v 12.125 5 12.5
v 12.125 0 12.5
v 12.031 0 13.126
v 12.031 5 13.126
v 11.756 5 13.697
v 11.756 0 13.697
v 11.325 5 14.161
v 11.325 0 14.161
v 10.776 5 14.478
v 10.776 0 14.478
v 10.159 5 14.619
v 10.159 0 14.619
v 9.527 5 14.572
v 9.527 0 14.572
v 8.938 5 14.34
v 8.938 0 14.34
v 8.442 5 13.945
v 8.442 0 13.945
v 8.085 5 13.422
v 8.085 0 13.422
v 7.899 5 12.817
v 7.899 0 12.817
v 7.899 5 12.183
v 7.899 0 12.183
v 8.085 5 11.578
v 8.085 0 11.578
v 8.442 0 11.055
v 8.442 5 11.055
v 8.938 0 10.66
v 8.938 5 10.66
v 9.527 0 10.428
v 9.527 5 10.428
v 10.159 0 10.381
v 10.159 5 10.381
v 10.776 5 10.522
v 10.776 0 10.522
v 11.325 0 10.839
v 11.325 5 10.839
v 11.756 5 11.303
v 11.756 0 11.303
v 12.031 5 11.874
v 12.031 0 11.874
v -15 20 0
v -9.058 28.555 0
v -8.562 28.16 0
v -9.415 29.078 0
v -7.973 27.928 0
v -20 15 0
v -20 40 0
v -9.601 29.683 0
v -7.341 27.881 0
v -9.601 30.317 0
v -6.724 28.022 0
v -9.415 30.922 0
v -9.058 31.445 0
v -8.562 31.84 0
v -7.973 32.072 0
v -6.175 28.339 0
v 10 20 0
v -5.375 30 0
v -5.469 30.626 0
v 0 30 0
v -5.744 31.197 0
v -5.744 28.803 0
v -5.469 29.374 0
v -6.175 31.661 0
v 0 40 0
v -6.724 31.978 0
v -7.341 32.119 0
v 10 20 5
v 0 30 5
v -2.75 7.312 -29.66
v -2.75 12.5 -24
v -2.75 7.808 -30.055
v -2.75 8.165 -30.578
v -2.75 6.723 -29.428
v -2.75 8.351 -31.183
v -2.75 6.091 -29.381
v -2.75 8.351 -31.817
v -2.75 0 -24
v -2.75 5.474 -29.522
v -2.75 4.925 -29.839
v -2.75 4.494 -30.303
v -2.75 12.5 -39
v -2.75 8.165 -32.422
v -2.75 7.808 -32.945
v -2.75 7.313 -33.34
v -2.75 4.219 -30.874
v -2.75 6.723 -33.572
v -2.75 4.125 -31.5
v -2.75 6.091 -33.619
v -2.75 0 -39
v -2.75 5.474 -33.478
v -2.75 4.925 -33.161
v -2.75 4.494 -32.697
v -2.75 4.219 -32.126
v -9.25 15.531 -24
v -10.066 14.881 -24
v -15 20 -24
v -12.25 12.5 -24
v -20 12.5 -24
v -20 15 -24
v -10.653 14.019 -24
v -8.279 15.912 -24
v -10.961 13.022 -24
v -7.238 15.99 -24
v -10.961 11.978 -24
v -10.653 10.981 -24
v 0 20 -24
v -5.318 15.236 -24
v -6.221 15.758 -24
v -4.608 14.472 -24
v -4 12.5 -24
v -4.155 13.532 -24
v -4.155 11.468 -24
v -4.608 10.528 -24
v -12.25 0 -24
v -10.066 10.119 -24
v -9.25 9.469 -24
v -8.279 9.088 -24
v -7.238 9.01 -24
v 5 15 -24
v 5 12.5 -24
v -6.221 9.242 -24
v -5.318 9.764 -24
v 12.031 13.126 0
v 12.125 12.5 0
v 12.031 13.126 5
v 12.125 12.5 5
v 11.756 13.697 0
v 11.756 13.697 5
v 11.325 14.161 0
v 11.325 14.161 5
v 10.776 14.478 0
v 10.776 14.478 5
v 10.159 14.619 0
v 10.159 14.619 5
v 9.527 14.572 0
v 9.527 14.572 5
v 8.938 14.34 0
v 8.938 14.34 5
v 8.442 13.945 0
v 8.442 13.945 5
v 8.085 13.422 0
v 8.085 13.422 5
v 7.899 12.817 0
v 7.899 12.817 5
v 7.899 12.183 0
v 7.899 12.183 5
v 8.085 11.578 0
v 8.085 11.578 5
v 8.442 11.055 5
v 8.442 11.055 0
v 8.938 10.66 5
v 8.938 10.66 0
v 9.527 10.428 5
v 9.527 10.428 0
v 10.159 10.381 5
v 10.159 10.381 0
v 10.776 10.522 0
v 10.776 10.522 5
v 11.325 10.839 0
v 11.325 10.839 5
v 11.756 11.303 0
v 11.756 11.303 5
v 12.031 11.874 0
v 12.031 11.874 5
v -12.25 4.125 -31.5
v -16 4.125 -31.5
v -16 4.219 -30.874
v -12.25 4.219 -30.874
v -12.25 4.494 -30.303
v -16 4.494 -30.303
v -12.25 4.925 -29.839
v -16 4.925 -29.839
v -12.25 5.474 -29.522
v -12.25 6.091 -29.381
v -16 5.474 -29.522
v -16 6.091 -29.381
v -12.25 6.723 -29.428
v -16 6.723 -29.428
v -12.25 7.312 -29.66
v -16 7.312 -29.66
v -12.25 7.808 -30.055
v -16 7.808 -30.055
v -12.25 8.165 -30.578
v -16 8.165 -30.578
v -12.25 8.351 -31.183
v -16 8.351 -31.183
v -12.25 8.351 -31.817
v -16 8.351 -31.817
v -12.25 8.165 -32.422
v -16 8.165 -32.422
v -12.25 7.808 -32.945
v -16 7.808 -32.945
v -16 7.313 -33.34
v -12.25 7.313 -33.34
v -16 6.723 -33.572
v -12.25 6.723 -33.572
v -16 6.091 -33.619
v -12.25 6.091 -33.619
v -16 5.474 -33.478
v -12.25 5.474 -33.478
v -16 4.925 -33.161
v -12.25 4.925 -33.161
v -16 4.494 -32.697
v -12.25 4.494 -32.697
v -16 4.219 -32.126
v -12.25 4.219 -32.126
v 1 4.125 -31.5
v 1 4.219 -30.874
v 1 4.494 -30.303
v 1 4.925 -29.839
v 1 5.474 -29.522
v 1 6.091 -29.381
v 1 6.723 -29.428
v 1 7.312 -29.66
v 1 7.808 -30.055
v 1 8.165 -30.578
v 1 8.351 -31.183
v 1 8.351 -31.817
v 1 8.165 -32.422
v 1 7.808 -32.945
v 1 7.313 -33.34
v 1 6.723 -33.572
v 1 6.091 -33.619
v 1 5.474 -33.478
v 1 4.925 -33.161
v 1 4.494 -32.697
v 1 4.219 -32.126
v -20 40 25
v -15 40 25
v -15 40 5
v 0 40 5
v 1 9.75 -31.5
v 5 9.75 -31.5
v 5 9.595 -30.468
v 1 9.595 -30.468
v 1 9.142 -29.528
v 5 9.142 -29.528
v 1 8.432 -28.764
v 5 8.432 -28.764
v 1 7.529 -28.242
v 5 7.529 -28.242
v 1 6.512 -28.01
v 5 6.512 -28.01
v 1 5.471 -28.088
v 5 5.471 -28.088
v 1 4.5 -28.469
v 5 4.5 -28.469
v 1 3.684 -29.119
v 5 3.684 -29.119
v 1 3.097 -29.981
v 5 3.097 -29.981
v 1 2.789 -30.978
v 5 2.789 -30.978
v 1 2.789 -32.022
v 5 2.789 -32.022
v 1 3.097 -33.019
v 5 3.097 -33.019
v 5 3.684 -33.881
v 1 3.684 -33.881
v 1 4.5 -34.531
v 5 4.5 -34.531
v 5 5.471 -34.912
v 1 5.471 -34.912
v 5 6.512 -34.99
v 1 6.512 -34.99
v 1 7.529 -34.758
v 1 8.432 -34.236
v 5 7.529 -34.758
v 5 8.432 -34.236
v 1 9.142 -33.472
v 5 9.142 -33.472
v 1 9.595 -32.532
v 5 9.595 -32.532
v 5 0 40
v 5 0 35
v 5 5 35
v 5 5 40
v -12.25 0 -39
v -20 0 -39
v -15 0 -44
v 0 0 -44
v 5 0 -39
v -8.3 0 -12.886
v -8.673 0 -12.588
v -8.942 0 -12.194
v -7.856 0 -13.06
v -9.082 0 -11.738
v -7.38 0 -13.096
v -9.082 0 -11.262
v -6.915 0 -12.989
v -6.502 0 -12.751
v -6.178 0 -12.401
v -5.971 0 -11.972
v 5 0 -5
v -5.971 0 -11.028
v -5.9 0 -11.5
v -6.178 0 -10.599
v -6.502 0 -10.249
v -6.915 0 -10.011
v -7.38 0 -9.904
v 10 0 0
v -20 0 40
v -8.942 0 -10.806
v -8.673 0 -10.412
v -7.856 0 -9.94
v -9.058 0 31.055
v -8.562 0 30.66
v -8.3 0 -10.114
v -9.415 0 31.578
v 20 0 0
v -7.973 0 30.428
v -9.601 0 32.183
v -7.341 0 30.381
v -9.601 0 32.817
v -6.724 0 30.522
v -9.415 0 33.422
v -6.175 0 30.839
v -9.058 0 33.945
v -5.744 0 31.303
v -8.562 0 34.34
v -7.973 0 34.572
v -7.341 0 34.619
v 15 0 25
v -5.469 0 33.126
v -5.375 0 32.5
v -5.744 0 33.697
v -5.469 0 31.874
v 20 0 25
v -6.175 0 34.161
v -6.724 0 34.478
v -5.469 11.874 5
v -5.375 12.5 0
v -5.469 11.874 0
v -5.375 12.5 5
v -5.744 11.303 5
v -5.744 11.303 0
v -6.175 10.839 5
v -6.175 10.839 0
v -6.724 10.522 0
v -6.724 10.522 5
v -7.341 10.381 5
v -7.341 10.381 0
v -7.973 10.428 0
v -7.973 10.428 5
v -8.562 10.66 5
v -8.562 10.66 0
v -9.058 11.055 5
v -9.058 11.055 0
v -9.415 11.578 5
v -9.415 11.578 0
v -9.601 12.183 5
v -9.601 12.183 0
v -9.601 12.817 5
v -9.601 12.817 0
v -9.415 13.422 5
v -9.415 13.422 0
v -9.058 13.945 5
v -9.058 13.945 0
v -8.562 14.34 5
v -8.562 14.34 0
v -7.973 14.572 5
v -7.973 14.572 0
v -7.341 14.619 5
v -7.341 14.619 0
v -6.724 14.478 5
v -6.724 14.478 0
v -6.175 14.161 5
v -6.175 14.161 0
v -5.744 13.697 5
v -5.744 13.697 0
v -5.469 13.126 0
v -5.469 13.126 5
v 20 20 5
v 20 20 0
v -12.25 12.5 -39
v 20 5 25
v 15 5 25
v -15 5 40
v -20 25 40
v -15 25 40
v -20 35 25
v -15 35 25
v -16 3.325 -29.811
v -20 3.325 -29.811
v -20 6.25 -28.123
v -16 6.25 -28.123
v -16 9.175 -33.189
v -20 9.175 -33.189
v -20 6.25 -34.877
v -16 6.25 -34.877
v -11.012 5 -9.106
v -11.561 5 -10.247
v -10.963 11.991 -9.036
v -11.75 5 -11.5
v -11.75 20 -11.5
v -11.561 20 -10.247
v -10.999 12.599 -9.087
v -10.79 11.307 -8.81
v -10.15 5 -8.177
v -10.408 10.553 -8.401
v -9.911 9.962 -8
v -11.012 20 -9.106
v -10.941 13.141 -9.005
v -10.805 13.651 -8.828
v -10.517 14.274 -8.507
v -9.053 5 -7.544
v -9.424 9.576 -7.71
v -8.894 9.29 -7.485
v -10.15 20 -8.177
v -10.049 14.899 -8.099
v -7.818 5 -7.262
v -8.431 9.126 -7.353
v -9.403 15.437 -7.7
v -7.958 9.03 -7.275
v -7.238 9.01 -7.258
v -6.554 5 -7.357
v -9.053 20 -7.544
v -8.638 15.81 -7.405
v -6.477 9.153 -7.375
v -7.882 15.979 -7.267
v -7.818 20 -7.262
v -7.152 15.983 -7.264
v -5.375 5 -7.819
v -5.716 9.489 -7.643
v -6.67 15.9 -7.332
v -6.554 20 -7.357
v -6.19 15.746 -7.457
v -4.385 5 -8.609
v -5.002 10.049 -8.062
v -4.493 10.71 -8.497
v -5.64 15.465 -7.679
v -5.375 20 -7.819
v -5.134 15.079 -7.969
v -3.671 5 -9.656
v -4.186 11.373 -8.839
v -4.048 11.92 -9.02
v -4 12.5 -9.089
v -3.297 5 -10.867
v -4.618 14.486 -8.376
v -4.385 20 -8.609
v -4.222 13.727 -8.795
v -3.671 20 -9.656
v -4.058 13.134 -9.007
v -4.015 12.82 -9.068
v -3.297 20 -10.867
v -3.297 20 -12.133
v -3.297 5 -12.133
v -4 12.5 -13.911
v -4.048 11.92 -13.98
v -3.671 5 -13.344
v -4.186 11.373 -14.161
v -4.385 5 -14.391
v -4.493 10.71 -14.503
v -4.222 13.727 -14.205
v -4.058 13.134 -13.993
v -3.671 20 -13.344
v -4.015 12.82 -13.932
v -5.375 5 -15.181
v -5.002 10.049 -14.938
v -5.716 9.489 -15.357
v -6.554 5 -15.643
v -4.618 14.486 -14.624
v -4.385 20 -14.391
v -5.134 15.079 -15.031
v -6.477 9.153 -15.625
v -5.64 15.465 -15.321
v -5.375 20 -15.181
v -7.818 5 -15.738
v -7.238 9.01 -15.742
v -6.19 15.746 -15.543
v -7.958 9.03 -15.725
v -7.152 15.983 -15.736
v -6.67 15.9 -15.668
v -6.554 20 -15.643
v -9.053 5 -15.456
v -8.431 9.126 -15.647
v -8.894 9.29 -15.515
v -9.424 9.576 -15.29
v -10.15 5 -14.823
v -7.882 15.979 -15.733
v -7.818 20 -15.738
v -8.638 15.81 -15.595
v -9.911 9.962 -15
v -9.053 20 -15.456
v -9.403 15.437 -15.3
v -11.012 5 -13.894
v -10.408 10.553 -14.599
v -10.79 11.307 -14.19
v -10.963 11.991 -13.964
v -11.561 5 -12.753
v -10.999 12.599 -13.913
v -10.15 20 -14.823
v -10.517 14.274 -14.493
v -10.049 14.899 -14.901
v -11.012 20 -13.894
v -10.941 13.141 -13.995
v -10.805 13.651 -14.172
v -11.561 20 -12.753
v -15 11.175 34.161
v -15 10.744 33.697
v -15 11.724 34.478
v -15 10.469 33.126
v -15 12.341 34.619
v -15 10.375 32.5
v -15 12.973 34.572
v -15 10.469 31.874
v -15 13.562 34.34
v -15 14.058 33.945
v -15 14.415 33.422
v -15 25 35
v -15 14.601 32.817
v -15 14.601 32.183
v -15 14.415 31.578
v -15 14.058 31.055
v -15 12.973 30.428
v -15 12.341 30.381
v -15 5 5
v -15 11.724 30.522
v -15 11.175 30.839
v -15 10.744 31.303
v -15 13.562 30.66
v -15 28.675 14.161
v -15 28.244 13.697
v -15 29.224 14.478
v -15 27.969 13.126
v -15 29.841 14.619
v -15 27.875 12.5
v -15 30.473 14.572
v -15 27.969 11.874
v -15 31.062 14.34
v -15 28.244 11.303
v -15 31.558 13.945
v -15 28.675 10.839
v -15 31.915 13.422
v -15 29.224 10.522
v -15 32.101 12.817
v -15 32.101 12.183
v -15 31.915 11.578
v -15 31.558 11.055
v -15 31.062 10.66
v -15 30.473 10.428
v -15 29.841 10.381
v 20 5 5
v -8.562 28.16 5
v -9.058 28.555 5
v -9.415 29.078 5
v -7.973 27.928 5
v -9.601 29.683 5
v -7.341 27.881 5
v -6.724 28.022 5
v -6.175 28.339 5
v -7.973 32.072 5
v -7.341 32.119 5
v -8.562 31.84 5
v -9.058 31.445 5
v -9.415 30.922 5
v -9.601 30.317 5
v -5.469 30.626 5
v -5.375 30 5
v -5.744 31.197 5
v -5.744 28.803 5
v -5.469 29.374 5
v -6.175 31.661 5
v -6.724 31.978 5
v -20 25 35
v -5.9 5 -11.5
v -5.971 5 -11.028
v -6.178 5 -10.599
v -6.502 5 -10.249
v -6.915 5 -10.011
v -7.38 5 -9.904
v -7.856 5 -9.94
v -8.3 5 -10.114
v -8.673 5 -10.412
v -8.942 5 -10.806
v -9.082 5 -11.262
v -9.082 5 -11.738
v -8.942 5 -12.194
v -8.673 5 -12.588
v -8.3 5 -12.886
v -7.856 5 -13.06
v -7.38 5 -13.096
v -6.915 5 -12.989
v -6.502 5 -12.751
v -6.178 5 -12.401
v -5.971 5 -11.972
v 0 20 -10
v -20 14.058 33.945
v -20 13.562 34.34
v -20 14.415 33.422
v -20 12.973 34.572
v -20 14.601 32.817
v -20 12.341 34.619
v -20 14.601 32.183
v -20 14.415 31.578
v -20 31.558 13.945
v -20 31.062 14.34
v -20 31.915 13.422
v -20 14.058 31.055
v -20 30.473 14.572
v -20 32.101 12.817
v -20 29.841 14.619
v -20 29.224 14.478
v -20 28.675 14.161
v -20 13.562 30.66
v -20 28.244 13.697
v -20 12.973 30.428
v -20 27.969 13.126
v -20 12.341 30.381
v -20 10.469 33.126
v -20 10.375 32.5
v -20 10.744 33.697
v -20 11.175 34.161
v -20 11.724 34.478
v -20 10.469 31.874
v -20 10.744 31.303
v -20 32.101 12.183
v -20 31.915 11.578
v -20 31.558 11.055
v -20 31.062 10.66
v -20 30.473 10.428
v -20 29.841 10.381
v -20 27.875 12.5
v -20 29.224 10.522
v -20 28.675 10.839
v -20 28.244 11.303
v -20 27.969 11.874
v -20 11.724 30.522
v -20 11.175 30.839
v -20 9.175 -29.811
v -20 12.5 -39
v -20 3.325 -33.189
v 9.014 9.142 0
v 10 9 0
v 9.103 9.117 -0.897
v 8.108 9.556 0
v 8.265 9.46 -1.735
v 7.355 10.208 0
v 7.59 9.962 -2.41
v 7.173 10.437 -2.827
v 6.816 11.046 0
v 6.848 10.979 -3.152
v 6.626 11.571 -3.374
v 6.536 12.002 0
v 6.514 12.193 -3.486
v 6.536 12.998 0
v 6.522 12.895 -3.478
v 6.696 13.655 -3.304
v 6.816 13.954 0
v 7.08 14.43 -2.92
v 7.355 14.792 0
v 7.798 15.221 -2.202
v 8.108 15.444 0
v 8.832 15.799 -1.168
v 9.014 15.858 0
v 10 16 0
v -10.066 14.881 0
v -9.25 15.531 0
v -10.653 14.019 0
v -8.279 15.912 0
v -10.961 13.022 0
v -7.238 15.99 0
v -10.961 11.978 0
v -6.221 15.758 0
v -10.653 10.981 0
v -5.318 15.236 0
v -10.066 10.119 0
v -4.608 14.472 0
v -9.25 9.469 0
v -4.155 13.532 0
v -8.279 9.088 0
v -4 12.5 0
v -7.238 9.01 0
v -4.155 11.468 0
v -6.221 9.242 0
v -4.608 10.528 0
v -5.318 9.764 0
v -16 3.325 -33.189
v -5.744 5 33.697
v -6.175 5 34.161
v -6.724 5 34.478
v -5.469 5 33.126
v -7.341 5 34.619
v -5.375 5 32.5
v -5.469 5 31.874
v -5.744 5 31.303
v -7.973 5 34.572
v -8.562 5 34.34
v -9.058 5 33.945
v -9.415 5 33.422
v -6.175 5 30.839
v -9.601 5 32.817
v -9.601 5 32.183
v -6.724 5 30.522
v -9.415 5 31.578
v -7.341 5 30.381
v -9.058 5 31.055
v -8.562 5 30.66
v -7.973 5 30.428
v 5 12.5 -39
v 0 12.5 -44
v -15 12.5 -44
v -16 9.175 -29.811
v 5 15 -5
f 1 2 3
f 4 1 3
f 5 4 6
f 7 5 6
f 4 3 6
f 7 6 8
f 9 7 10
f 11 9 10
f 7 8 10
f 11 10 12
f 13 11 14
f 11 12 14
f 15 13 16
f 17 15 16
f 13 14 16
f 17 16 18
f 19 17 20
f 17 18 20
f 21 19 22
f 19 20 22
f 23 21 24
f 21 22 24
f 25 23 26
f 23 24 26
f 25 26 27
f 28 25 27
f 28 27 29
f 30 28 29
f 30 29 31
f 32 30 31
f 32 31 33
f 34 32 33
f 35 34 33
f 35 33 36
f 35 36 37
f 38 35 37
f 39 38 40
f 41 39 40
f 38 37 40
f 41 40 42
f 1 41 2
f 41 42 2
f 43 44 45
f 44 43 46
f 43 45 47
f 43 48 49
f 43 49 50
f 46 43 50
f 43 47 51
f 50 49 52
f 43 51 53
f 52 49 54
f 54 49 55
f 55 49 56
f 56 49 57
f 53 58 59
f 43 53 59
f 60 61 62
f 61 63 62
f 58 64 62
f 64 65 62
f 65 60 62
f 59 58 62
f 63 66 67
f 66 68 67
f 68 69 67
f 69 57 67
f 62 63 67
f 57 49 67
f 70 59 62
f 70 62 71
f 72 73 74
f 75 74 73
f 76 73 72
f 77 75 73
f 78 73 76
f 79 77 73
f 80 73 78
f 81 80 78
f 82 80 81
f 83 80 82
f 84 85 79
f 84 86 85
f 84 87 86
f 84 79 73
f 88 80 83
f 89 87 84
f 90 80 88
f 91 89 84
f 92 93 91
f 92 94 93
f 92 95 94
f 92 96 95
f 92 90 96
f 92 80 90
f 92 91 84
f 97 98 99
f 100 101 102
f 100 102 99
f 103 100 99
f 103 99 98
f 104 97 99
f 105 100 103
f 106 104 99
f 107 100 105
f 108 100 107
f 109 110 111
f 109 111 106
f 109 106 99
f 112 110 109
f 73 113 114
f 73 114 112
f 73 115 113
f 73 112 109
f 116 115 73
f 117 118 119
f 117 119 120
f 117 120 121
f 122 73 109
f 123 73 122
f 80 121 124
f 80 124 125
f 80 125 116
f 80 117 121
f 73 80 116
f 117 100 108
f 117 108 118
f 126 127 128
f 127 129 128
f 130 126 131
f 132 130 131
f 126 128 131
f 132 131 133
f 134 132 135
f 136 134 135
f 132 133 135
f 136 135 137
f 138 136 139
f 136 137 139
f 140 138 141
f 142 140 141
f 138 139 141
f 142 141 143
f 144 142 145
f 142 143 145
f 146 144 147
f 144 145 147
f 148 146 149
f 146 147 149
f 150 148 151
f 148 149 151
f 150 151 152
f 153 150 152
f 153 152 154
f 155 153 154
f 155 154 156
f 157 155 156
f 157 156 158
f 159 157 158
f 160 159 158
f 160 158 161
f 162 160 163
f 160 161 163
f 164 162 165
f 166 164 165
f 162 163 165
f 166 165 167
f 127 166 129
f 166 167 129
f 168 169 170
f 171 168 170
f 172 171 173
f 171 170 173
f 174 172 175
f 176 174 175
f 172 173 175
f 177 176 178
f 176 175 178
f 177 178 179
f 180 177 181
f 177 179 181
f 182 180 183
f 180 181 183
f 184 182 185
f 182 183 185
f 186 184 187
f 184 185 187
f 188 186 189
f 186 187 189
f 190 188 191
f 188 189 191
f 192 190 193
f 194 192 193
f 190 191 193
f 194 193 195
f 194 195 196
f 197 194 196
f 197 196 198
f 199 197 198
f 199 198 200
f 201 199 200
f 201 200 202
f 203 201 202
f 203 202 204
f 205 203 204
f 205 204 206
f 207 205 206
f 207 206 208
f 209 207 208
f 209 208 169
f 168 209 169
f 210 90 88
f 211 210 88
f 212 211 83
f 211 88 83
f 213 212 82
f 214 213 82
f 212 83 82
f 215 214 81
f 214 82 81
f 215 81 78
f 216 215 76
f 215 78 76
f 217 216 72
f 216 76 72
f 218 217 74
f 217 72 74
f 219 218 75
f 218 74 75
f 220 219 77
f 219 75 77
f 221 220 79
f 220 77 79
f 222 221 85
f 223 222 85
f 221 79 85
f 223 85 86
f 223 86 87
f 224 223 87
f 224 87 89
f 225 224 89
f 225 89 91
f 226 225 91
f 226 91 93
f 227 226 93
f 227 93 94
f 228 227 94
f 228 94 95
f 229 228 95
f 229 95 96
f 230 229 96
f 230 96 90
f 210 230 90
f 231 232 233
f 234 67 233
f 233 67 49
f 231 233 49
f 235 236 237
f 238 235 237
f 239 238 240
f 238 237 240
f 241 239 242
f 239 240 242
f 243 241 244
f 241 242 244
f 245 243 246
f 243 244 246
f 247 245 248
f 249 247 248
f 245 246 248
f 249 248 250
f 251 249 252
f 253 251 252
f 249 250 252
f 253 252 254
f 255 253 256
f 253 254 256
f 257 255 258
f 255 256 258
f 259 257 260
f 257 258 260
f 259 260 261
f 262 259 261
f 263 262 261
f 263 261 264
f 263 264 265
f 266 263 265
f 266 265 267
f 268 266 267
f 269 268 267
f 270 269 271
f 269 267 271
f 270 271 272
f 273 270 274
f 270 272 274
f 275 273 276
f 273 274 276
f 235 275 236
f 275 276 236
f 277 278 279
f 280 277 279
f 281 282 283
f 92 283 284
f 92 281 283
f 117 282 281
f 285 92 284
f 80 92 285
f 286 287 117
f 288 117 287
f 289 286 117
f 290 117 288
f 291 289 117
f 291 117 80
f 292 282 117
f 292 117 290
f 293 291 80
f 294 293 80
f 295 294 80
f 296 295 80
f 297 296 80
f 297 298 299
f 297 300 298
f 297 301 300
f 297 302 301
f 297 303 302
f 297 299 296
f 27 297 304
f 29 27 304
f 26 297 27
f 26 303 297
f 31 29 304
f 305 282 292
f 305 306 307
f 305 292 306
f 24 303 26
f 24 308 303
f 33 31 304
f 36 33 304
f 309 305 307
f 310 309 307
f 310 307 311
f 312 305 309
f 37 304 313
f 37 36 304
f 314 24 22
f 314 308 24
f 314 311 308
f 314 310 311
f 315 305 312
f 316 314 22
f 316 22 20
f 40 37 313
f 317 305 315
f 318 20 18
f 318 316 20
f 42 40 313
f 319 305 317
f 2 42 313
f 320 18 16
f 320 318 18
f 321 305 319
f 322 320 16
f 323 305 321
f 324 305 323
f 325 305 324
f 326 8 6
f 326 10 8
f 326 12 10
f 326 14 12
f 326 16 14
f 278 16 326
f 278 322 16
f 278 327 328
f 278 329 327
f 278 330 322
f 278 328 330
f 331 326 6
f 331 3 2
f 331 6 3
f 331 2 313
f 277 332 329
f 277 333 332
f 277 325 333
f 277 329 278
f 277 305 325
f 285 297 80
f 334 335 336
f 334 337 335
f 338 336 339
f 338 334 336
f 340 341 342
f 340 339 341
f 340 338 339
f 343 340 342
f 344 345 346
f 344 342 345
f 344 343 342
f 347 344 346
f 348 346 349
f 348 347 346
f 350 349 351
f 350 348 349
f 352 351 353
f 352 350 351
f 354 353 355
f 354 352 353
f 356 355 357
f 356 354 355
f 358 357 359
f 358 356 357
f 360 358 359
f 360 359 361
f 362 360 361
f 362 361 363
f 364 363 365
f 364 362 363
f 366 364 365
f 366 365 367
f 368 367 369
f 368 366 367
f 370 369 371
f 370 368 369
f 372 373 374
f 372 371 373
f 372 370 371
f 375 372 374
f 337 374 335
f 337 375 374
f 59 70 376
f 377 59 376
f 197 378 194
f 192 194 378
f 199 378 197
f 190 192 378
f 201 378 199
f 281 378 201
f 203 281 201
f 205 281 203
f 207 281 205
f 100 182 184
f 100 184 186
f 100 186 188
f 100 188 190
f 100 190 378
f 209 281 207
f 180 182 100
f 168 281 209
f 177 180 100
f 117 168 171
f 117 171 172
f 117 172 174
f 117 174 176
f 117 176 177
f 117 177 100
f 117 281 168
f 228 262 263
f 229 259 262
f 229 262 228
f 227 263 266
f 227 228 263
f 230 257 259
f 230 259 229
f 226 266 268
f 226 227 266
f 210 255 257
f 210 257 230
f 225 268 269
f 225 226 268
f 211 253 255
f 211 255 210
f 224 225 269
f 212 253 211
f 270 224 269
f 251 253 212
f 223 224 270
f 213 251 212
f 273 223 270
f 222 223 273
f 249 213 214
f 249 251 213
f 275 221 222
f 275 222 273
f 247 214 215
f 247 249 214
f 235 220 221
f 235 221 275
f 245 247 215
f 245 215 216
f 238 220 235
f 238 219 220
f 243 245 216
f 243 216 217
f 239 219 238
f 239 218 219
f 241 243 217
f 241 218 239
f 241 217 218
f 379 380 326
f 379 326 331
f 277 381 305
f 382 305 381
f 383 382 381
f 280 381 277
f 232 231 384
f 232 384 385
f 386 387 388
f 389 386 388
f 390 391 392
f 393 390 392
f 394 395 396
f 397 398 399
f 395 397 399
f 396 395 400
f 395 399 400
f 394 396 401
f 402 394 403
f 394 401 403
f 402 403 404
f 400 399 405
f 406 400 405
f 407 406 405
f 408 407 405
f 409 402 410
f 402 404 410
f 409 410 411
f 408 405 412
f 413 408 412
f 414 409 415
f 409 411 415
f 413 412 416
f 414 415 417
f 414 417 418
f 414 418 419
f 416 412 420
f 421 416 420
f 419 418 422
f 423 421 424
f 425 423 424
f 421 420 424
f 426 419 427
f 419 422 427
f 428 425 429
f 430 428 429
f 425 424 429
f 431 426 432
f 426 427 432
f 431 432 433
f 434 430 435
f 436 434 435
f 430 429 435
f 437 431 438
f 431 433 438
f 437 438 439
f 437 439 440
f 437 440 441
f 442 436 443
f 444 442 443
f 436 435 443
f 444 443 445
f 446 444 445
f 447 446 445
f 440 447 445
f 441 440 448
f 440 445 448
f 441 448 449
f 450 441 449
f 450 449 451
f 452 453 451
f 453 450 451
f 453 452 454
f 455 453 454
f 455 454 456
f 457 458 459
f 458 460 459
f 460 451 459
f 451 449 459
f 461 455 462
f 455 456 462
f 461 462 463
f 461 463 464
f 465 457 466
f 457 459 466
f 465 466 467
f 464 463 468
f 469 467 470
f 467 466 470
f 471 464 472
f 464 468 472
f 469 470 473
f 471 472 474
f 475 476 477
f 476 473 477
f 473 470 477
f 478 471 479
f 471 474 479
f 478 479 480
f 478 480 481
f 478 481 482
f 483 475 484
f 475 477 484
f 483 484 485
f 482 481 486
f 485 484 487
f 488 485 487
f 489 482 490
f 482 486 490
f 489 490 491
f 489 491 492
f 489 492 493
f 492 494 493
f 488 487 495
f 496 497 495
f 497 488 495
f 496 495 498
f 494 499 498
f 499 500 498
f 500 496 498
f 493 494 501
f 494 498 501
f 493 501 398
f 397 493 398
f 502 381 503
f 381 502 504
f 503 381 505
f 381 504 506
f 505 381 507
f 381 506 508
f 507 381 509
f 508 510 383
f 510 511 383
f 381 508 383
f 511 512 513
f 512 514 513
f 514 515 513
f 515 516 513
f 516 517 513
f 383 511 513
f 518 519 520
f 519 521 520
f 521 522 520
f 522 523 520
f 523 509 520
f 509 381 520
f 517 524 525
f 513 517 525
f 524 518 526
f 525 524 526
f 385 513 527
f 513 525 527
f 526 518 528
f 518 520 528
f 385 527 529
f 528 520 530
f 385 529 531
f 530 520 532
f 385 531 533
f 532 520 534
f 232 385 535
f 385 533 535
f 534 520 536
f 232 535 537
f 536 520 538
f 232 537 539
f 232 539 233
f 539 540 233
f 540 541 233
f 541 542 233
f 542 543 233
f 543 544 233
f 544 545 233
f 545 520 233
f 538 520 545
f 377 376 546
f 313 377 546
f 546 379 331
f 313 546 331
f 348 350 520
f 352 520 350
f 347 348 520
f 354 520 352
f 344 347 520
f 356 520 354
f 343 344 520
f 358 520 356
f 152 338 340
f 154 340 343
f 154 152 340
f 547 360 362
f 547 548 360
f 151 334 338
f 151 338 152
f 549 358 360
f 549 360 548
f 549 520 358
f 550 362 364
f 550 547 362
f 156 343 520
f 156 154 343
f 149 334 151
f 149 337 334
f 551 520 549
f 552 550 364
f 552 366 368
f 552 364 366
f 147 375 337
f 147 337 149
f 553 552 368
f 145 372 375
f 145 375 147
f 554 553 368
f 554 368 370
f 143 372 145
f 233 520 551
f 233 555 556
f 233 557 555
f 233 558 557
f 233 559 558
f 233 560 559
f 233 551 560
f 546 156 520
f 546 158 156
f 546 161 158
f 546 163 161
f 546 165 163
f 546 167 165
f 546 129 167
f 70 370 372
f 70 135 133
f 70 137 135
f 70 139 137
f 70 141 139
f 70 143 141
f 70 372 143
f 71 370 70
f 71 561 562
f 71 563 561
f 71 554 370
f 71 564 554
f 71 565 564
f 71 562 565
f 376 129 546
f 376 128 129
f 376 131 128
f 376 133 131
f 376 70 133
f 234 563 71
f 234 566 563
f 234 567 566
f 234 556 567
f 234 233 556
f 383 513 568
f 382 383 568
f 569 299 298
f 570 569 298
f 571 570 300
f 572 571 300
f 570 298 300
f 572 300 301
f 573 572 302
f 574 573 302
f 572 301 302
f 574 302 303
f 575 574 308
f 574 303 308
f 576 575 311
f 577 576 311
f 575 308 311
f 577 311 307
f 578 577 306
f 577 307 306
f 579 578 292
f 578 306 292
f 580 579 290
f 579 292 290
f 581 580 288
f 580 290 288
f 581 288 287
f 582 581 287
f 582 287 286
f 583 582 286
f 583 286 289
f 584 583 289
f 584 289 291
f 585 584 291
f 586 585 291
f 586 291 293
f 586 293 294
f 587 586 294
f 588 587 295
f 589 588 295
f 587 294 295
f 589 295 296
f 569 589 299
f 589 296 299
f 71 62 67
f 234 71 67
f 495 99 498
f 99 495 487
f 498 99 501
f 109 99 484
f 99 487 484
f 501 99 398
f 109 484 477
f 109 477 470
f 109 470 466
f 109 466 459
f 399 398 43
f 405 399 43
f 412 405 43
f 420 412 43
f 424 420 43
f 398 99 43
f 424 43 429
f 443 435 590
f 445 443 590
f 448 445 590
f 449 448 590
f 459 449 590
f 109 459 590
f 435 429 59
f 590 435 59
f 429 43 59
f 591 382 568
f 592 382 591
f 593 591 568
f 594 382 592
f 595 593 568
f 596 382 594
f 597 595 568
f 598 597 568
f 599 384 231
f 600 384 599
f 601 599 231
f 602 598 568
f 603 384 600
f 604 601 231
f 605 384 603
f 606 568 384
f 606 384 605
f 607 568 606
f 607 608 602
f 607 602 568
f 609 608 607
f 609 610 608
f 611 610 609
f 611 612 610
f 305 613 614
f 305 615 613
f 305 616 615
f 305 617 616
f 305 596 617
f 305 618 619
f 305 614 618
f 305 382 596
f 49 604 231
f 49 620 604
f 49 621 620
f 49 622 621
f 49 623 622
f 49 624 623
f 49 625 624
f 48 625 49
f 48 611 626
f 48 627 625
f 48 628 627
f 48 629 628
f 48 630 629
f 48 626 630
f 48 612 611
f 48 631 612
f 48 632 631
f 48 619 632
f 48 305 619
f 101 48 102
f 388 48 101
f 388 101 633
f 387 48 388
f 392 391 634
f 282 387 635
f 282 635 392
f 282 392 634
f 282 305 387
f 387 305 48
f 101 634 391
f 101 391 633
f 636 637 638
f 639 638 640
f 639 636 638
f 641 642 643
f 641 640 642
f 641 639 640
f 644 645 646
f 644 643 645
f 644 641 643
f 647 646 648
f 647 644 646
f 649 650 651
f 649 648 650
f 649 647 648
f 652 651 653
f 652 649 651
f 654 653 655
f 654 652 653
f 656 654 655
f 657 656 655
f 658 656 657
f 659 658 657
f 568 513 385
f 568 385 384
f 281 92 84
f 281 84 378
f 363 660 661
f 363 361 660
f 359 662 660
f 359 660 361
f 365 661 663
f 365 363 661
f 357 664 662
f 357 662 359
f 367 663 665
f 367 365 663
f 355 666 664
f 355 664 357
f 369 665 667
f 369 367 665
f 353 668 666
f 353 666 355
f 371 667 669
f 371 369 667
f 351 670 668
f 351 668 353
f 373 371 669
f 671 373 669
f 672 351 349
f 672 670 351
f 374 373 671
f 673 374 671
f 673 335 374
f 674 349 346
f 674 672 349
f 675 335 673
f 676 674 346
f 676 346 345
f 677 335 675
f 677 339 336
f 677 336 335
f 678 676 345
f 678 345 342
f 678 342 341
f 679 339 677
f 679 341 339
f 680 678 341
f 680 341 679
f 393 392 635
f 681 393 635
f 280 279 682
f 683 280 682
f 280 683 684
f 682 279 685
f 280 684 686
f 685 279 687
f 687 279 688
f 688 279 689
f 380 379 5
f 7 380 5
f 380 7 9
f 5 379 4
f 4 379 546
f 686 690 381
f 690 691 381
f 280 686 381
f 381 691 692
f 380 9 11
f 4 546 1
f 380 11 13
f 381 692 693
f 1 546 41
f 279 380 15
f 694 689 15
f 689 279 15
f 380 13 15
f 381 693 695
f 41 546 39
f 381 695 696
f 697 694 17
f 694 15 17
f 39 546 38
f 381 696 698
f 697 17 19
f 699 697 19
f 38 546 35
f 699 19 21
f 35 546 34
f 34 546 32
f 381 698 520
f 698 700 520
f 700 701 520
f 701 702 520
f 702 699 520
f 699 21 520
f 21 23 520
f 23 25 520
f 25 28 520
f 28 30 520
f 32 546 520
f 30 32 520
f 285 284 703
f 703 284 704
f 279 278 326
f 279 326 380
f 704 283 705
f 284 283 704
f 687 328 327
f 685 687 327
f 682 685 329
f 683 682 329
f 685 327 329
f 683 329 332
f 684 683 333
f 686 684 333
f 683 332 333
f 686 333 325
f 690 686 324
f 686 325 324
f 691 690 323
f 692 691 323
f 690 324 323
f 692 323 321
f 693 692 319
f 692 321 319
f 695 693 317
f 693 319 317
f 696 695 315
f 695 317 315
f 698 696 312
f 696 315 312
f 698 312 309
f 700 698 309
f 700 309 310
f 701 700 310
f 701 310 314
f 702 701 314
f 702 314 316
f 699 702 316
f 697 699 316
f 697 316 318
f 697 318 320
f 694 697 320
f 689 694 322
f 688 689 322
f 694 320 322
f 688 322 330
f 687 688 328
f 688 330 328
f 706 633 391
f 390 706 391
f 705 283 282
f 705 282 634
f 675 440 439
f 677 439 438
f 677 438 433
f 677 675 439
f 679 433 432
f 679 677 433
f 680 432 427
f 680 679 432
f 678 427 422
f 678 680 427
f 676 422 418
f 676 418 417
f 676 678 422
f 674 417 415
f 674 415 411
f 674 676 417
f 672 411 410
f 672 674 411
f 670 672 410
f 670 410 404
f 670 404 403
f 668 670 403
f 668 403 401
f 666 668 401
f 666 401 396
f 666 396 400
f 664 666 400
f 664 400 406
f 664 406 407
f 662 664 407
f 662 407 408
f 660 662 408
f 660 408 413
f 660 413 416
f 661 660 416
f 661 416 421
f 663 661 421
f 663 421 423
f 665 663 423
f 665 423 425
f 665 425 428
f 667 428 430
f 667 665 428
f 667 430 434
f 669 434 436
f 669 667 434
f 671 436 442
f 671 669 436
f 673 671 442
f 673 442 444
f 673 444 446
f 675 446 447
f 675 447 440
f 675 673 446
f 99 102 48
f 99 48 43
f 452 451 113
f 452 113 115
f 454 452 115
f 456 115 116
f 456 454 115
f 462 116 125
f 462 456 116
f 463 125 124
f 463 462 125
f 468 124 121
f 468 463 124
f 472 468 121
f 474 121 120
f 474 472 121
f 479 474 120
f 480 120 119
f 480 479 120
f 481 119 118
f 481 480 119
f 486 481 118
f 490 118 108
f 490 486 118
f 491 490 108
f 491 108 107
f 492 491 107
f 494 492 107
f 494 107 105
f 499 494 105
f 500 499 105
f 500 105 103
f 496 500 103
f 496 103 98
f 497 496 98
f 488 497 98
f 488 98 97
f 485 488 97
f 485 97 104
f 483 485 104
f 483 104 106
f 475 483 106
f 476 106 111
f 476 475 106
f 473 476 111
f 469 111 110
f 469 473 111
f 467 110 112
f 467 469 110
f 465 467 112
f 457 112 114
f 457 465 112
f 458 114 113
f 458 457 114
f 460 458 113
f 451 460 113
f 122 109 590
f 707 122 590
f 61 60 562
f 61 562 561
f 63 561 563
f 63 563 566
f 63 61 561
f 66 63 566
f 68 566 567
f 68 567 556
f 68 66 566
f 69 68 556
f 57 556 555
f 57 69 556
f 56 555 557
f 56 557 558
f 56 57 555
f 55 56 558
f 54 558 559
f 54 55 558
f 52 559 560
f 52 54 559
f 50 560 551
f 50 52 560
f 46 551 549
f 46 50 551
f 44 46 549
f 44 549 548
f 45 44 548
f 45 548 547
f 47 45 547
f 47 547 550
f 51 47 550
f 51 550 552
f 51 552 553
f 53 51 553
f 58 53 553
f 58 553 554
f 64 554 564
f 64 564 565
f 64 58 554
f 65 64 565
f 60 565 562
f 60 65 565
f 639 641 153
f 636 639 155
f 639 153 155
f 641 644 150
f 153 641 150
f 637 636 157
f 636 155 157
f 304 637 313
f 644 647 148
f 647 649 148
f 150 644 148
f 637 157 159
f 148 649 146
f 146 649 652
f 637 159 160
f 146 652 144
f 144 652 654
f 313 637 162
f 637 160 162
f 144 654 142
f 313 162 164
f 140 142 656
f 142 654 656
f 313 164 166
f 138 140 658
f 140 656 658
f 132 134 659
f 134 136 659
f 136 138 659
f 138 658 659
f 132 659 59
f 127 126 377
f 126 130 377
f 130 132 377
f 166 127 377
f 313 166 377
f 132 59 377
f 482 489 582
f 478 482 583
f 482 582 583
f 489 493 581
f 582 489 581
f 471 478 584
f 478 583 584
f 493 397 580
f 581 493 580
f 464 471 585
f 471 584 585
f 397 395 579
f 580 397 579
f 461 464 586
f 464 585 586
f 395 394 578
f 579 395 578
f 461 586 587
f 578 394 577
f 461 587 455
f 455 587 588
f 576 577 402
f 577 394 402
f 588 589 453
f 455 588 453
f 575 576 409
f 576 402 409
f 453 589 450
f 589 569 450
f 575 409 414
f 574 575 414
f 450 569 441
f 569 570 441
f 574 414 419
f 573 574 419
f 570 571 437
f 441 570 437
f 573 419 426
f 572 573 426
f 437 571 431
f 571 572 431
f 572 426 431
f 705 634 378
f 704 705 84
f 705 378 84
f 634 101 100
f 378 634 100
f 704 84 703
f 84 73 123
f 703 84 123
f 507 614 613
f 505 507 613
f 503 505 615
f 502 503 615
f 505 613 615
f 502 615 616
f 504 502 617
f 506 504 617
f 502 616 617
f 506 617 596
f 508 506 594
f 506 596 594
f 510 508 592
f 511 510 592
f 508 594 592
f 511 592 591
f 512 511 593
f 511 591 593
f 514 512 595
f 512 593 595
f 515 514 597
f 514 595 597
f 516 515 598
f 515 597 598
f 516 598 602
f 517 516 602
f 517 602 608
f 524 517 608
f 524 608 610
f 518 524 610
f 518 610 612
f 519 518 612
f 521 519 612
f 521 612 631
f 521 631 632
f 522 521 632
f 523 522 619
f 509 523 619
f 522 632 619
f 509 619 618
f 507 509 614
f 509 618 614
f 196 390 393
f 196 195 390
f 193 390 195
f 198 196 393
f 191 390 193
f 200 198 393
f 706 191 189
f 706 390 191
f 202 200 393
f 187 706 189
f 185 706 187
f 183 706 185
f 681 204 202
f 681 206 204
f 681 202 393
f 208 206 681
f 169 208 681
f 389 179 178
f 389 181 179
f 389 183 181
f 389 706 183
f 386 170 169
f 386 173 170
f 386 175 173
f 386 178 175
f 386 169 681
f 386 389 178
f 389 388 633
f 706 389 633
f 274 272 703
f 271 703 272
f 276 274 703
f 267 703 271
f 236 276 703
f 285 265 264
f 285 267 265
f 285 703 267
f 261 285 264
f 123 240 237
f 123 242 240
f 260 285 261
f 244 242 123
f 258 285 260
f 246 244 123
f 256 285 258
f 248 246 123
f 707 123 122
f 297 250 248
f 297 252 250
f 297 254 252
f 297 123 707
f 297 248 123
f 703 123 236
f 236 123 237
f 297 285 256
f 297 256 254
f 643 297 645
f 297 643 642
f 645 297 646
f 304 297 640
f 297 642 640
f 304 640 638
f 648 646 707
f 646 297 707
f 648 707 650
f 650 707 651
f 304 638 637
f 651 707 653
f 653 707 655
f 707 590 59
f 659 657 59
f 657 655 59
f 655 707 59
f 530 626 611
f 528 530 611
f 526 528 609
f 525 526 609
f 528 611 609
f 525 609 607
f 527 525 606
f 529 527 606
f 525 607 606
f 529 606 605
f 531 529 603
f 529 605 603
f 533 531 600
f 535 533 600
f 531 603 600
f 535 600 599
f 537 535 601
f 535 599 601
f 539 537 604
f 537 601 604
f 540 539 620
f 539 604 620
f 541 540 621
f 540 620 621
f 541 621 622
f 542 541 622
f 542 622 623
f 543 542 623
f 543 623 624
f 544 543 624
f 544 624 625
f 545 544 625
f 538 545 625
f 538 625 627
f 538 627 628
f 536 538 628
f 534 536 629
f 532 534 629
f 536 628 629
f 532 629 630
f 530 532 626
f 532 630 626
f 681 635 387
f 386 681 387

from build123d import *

# Parameters (mm, degrees)
F0_R         = 2.125
F1_DEPTH     = 5
F3_DEPTH     = 20
F5_DEPTH     = 15
F6_SIZE      = 10
F7_R         = 2.125
F8_DEPTH     = 5
F9_R         = 2.125
F10_DEPTH    = 5
F11_W        = 40
F11_H        = 20
F11_R        = 2.125
F12_DEPTH    = 24
F13_R        = 4.25
F14_DEPTH    = 25
F15_R        = 3.5
F16_DEPTH    = 25
F17_R        = 4.25
F17_R_2      = 1.6
F18_DEPTH    = 5
F19_T4_DEPTH = 20
F19_S5_R     = 2.125
F19_T6_DEPTH = 12
F19_T7_DEPTH = 36.8584149398
F21_DEPTH    = 12.5
F22_SIZE     = 5
F23_R        = 3.5
F24_DEPTH    = 44.001
F25_R        = 2.125
F26_DEPTH    = 40.001
F28_DEPTH    = 4
F29_R        = 3.5
F30_DEPTH    = 4


# Not quite as in the source:
# - a fillet or chamfer that OpenCascade refuses, or shapes differently, is made with other operations: its cross-section is extruded or revolved along the edge and cut away or added


with BuildPart() as f1:
    # F0 (on Top) → F1 (new body)
    with BuildSketch(Plane.XY):
        Polygon((0, 20), (0, 40), (-20, 40), (-20, 0), (20, 0), (20, 20), align=None)
        with Locations((-7.5, 12.5)):
            Circle(F0_R, mode=Mode.SUBTRACT)
        with Locations((10, 12.5)):
            Circle(F0_R, mode=Mode.SUBTRACT)
        with Locations((-7.5, 30)):
            Circle(F0_R, mode=Mode.SUBTRACT)
    extrude(amount=F1_DEPTH)

    # F2 (on face) → F3 (join)
    with BuildSketch(Plane.XY.offset(5)):
        Polygon((-15, 40), (-20, 40), (-20, 0), (20, 0), (20, 5), (-15, 5), align=None)
    extrude(amount=F3_DEPTH)

    # F4 (on face) → F5 (join)
    with BuildSketch(Plane.XY.offset(25)):
        Polygon((-15, 5), (-15, 25), (-20, 25), (-20, 0), (5, 0), (5, 5), align=None)
    extrude(amount=F5_DEPTH)

    # F6
    f6_edges = [f1.edges().sort_by_distance(p)[0] for p in [
        (0, 20, 2.5),
        (-17.5, 25, 25),
        (5, 2.5, 25),
    ]]
    chamfer(f6_edges, length=F6_SIZE)

    # F7 (on face) → F8 (cut)
    with BuildSketch(Plane.XZ):
        with Locations((-7.5, 32.5)):
            Circle(F7_R)
        with Locations((10, 12.5)):
            Circle(F7_R)
    extrude(amount=-F8_DEPTH, mode=Mode.SUBTRACT)

    # F9 (on face) → F10 (cut)
    with BuildSketch(Plane(origin=(-20, 0, 0), x_dir=(0, -1, 0), z_dir=(-1, 0, 0))):
        with Locations((-12.5, 32.5)):
            Circle(F9_R)
        with Locations((-30, 12.5)):
            Circle(F9_R)
    extrude(amount=-F10_DEPTH, mode=Mode.SUBTRACT)

    # F11 (on face) → F12 (join)
    with BuildSketch(Plane(origin=(0, 0, 0), x_dir=(1, 0, 0), z_dir=(0, 0, -1))):
        with Locations((0, -10)):
            Rectangle(F11_W, F11_H)
        with Locations((-7.5, -12.5)):
            Circle(F11_R, mode=Mode.SUBTRACT)
        with Locations((10, -12.5)):
            Circle(F11_R, mode=Mode.SUBTRACT)
    extrude(amount=F12_DEPTH)

    # F13 (on face) → F14 (cut)
    with BuildSketch(Plane(origin=(0, 20, 0), x_dir=(-1, 0, 0), z_dir=(0, 1, 0))):
        with Locations((7.5, -11.5)):
            Circle(F13_R)
        Polygon((-5, -24), (-5, -11.5), (-5, 0), (-20, 0), (-20, -24), align=None)
    extrude(amount=-F14_DEPTH, mode=Mode.SUBTRACT)

    # F15 (on face) → F16 (cut)
    with BuildSketch(Plane(origin=(0, 0, 0), x_dir=(1, 0, 0), z_dir=(0, 0, -1))):
        with Locations((-7.5, -12.5)):
            Circle(F15_R)
    extrude(amount=F16_DEPTH, mode=Mode.SUBTRACT)

    # F17 (on face) → F18 (join)
    with BuildSketch(Plane.XZ):
        with Locations((-7.5, -11.5)):
            Circle(F17_R)
        with Locations((-7.5, -11.5)):
            Circle(F17_R_2, mode=Mode.SUBTRACT)
    extrude(amount=-F18_DEPTH)

    # F19: chamfer of 5 on 2 edges, made by hand


with BuildPart() as f19_tool2:
    # F19_s3 → F19_t4 (new body)
    with BuildSketch(Plane.XZ.offset(-20)):
        Polygon((5, -5), (10, 0), (5, 0), align=None)
    extrude(amount=F19_T4_DEPTH)

    # F19_s5 → F19_t6 (cut, symmetric)
    with BuildSketch(Plane.XY.offset(-2.5)):
        with Locations((10, 12.5)):
            Circle(F19_S5_R)
    extrude(amount=F19_T6_DEPTH, both=True, mode=Mode.SUBTRACT)


with BuildPart() as f1_1:
    add(f1.part)

    # F19_t1: union F19_tool2
    add(f19_tool2.part)

    # F19_s8 → F19_t7 (cut)
    with BuildSketch(Plane.XY.offset(-36.8584149398)):
        Polygon((-20, 15), (-15, 20), (-20, 20), align=None)
    extrude(amount=F19_T7_DEPTH, mode=Mode.SUBTRACT)

    # F20 (on face) → F21 (join)
    with BuildSketch(Plane.XZ):
        Polygon((-12.25, -24), (-20, -24), (-20, -44), (5, -44), (5, -24), (-2.75, -24), (-2.75, -39), (-12.25, -39), align=None)
    extrude(amount=-F21_DEPTH)

    # F22
    f22_edges = [f1_1.edges().sort_by_distance(p)[0] for p in [
        (-20, 6.25, -44),
        (5, 6.25, -44),
        (5, 20, -14.5),
    ]]
    chamfer(f22_edges, length=F22_SIZE)

    # F23 (on face) → F24 (cut, through all)
    with BuildSketch(Plane(origin=(0, 0, 0), x_dir=(1, 0, 0), z_dir=(0, 0, -1))):
        with Locations((10, -12.5)):
            Circle(F23_R)
    extrude(amount=F24_DEPTH, mode=Mode.SUBTRACT)

    # F25 (on face) → F26 (cut, through all)
    with BuildSketch(Plane(origin=(-20, 0, 0), x_dir=(0, -1, 0), z_dir=(-1, 0, 0))):
        with Locations((-6.25, -31.5)):
            Circle(F25_R)
    extrude(amount=-F26_DEPTH, mode=Mode.SUBTRACT)

    # F27 (on face) → F28 (cut)
    with BuildSketch(Plane(origin=(-20, 0, 0), x_dir=(0, -1, 0), z_dir=(-1, 0, 0))):
        Polygon((-3.325, -33.1887495374), (-3.325, -29.8112504626), (-6.25, -28.1225009252), (-9.175, -29.8112504626), (-9.175, -33.1887495374), (-6.25, -34.8774990748), align=None)
    extrude(amount=-F28_DEPTH, mode=Mode.SUBTRACT)

    # F29 (on face) → F30 (cut)
    with BuildSketch(Plane.YZ.offset(5)):
        with Locations((6.25, -31.5)):
            Circle(F29_R)
    extrude(amount=-F30_DEPTH, mode=Mode.SUBTRACT)


solid = f1_1.part
